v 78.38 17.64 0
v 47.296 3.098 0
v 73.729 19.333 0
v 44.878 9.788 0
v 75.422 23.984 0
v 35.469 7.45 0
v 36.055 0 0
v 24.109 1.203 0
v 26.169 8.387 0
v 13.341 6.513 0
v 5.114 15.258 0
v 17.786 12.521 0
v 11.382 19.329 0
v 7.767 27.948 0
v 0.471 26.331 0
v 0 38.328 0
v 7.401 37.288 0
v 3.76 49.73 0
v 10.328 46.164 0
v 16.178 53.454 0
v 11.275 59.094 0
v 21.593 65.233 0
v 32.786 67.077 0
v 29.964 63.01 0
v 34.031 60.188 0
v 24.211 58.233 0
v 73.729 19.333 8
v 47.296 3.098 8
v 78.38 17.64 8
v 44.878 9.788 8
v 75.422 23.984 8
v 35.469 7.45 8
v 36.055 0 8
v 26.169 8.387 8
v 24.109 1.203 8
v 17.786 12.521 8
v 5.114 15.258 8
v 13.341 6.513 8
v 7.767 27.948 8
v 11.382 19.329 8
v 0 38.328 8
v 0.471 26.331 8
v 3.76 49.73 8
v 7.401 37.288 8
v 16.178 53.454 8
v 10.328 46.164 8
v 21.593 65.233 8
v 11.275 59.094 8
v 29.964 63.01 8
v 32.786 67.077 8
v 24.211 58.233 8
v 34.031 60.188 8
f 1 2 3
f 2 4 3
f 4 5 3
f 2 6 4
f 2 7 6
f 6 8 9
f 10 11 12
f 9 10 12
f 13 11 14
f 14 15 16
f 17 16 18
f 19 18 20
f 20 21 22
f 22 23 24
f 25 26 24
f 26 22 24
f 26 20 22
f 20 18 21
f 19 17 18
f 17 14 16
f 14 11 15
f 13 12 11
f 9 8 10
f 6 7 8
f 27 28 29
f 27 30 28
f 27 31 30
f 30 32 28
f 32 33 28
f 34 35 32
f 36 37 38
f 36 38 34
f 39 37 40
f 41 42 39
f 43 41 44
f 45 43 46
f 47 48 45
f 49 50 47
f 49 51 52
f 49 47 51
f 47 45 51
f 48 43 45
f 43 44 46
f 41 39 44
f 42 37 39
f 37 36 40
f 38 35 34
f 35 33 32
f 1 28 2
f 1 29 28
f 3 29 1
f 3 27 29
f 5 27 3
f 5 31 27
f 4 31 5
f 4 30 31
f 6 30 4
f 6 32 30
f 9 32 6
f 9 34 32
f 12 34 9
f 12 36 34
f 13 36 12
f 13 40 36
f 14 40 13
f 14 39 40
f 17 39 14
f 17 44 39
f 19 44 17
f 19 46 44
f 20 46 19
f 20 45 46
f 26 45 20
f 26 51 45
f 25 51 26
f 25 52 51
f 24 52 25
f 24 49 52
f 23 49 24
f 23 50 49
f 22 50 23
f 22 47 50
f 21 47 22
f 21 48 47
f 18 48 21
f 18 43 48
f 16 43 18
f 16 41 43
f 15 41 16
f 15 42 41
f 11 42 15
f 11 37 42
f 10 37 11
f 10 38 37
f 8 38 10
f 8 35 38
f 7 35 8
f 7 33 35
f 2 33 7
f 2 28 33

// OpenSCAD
$fn = 32;

// ----------------------------------------------------------------------
// Hook plate: curl radius 30 mm over 205 degrees, 7 mm thick band
// ----------------------------------------------------------------------

// --- parameters (mm) ---
profile_height = 8;       // extrusion height
profile_points = 26;      // points of the closed outline

profile = [[29.964, 63.01], [32.786, 67.077], [21.593, 65.233], [11.275, 59.094], [3.76, 49.73], [0, 38.328], [0.471, 26.331], [5.114, 15.258], [13.341, 6.513], [24.109, 1.203], [36.055, 0], [47.296, 3.098], [78.38, 17.64], [73.729, 19.333], [75.422, 23.984], [44.878, 9.788], [35.469, 7.45], [26.169, 8.387], [17.786, 12.521], [11.382, 19.329], [7.767, 27.948], [7.401, 37.288], [10.328, 46.164], [16.178, 53.454], [24.211, 58.233], [34.031, 60.188]];  // single closed polygon, 26 points, counter clockwise

// --- the one profile operation ---
linear_extrude(height = profile_height) polygon(points = profile);
